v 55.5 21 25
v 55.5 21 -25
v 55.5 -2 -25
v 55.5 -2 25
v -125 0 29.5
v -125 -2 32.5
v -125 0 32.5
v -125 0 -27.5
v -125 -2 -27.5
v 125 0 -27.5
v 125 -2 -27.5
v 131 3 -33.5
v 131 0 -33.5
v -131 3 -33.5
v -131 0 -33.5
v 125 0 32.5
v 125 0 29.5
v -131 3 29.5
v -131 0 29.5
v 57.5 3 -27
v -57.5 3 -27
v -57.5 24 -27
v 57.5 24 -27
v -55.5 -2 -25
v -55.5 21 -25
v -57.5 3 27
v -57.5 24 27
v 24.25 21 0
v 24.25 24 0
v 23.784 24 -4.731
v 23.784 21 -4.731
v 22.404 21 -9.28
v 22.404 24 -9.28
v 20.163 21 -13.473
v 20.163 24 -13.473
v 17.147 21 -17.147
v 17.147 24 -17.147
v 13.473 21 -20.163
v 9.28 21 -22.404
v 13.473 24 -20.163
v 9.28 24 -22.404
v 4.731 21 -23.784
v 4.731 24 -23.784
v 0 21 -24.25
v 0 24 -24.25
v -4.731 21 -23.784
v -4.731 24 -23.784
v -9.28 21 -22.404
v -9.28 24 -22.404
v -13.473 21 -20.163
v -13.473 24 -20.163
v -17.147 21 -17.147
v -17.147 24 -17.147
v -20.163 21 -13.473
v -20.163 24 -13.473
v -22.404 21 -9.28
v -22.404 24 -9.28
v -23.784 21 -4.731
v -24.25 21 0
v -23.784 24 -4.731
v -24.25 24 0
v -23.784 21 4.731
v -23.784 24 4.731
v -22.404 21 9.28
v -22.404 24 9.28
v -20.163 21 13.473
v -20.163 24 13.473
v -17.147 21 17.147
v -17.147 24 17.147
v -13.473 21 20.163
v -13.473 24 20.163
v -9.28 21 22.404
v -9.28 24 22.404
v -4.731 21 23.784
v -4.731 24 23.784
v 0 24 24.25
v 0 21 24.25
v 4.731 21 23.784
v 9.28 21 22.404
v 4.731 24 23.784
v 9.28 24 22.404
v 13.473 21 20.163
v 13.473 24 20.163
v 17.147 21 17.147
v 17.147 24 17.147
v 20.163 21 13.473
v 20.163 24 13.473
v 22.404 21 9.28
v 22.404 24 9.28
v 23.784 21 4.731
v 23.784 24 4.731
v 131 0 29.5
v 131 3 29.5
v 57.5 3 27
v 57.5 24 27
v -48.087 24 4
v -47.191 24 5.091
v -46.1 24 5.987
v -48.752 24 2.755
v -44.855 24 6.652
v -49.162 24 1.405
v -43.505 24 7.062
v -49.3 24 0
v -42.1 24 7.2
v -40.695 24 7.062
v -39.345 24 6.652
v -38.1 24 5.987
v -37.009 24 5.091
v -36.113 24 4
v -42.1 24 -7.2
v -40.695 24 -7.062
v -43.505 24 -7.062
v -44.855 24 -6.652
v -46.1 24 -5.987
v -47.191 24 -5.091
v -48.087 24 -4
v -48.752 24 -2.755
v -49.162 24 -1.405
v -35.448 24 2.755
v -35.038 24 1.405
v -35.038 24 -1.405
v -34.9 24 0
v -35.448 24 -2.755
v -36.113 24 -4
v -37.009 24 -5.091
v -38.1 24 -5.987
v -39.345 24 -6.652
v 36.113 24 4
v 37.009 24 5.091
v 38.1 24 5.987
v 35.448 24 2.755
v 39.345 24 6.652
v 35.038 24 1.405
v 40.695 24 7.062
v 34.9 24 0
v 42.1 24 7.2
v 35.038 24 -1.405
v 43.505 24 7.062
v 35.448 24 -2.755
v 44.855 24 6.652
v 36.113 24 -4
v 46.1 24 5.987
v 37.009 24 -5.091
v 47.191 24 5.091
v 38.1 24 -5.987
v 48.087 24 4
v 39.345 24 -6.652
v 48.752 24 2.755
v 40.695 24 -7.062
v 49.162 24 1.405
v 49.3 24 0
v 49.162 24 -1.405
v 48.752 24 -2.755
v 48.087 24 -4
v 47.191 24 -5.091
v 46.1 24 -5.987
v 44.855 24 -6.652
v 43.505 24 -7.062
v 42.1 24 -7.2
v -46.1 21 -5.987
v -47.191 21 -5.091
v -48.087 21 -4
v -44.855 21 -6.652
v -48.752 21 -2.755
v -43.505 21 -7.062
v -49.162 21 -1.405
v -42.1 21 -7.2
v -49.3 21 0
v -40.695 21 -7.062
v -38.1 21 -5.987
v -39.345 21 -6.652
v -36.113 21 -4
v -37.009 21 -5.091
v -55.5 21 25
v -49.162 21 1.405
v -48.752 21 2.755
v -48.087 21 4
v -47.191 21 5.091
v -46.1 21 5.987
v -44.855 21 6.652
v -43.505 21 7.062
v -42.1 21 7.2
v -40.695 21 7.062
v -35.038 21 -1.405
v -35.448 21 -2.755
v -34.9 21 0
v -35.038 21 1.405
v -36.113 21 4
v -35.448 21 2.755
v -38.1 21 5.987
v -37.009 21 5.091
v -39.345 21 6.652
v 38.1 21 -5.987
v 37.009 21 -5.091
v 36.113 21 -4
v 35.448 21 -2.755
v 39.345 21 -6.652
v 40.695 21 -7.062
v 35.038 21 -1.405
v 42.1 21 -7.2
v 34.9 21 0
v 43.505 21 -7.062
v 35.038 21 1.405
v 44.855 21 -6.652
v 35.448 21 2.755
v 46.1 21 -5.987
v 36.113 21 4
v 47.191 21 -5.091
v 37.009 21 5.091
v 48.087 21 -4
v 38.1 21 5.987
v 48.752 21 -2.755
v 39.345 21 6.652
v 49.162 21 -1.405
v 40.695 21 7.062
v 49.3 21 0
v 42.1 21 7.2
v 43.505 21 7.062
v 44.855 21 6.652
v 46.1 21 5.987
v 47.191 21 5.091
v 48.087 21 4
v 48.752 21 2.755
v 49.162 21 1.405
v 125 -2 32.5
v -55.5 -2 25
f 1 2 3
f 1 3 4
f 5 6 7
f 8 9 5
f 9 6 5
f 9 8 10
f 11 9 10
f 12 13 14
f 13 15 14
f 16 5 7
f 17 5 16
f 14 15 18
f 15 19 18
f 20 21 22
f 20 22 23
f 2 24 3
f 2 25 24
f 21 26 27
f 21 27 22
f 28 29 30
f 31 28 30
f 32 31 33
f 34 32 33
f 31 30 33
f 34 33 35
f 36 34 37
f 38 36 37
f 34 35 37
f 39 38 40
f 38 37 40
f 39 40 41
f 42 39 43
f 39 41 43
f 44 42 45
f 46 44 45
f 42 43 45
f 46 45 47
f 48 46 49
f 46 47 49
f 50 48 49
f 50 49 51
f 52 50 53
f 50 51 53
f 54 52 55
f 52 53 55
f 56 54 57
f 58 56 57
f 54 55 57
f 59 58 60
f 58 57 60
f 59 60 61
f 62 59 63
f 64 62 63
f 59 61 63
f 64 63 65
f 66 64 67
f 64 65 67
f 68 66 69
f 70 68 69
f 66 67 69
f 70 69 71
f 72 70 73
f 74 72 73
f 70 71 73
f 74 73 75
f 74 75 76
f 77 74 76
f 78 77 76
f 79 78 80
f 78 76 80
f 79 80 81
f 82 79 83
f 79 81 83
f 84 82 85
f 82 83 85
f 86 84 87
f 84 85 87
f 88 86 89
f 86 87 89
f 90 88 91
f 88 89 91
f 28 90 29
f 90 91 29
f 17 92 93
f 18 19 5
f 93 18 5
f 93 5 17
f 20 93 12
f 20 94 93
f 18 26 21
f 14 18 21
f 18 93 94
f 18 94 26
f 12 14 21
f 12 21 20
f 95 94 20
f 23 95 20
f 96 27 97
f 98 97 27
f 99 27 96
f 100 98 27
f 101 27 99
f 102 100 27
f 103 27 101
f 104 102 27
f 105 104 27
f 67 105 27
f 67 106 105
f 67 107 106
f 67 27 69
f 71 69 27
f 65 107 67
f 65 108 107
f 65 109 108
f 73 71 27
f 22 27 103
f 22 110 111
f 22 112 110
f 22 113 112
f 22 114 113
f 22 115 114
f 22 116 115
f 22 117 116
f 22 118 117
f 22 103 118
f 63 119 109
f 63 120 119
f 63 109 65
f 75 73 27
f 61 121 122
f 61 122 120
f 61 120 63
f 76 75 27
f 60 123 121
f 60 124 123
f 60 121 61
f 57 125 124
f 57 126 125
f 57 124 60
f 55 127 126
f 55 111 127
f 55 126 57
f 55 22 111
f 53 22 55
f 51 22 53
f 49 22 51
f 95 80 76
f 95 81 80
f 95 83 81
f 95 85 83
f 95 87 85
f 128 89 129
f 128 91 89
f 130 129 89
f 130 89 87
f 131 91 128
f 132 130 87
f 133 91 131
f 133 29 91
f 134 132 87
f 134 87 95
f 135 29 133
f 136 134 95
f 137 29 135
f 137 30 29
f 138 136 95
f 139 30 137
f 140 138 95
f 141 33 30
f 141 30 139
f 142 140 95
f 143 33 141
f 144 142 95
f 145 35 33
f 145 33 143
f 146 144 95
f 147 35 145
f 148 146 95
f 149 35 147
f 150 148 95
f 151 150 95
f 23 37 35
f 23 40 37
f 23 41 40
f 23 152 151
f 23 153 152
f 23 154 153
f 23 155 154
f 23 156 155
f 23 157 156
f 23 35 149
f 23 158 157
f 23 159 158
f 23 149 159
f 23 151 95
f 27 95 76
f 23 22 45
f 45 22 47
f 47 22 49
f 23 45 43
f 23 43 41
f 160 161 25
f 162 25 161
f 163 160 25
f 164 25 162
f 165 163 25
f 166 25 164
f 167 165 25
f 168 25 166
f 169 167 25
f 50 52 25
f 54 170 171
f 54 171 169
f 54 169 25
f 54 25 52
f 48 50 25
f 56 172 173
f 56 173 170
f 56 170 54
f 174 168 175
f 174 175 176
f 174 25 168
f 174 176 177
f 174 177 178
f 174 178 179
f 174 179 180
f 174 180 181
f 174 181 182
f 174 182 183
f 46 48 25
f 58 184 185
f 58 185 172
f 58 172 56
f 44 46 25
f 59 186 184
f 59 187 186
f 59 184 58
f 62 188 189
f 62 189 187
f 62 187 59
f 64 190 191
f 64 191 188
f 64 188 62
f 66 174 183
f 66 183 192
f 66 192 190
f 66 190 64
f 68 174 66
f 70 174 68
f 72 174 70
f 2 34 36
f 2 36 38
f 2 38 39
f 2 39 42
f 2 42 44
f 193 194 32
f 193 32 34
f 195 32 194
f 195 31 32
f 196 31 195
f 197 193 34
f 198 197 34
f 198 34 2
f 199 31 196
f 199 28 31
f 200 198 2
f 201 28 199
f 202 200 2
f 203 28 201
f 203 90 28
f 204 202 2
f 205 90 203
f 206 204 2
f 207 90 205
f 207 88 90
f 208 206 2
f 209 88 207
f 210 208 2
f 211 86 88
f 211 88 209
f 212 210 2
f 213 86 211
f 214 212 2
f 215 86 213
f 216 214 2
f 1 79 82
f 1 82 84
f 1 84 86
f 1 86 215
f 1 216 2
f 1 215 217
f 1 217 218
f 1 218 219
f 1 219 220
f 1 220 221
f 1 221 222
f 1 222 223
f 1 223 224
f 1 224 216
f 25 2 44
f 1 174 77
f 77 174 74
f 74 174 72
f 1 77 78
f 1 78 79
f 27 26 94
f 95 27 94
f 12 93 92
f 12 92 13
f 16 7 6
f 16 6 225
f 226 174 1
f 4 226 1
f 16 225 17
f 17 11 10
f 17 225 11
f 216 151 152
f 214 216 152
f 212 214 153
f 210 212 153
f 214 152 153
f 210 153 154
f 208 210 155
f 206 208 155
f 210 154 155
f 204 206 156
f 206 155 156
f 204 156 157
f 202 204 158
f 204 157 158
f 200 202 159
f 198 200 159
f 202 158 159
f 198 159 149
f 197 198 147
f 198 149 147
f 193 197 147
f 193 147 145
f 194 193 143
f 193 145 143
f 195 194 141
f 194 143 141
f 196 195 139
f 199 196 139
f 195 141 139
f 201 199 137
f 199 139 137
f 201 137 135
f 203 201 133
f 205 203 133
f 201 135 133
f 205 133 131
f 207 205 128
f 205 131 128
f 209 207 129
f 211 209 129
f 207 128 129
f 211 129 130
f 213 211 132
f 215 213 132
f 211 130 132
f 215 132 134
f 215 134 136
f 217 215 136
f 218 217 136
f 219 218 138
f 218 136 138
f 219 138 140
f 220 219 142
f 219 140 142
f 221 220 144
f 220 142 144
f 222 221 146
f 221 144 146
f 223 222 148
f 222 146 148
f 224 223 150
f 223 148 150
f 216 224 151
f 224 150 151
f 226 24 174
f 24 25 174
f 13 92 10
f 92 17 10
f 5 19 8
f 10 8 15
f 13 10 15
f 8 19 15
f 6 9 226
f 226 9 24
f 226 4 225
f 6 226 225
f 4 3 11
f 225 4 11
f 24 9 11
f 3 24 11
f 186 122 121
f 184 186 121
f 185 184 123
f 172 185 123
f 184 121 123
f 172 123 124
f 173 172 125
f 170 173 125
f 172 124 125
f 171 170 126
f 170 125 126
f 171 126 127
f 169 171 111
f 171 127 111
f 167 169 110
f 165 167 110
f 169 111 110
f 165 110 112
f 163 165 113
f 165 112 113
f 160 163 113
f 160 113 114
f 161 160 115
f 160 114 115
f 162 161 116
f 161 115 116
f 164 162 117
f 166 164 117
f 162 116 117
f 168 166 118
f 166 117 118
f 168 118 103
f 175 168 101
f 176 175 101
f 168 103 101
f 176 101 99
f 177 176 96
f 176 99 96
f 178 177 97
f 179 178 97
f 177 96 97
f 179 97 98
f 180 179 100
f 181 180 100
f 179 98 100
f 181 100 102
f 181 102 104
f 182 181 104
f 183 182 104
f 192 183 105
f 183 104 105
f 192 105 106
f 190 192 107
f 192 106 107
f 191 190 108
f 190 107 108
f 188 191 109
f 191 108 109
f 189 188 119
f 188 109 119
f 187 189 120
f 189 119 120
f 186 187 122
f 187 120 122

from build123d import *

# Parameters (mm, degrees)
SKETCH1_W           = 254
SKETCH1_H           = 59
BOSS_EXTRUDE1_DEPTH = 3
SKETCH2_W           = 115
SKETCH2_H           = 54
BOSS_EXTRUDE2_DEPTH = 21
SKETCH3_W           = 111
SKETCH3_H           = 50
CUT_EXTRUDE3_DEPTH  = 21
SKETCH4_R           = 7.2
SKETCH4_R_2         = 24.25
CUT_EXTRUDE4_DEPTH  = 3
SKETCH5_W           = 250
SKETCH5_H           = 59
SKETCH5_W_2         = 111
SKETCH5_H_2         = 50
BOSS_EXTRUDE3_DEPTH = 2
SKETCH6_W           = 59
SKETCH6_H           = 3
BOSS_EXTRUDE4_DEPTH = 4
SKETCH7_W           = 258
SKETCH7_H           = 3
BOSS_EXTRUDE5_DEPTH = 4
SKETCH8_W           = 63
SKETCH8_H           = 3
BOSS_EXTRUDE6_DEPTH = 4
SKETCH9_W           = 250
SKETCH9_H           = 2
BOSS_EXTRUDE7_DEPTH = 1


with BuildPart() as part:
    # Sketch1 → Boss-Extrude1 (new body)
    with BuildSketch(Plane(origin=(0, 0, 0), x_dir=(1, 0, 0), z_dir=(0, 1, 0))):
        Rectangle(SKETCH1_W, SKETCH1_H)
    extrude(amount=BOSS_EXTRUDE1_DEPTH)

    # Sketch2 → Boss-Extrude2 (add)
    with BuildSketch(Plane(origin=(0, 3, 0), x_dir=(1, 0, 0), z_dir=(0, 1, 0))):
        Rectangle(SKETCH2_W, SKETCH2_H)
    extrude(amount=BOSS_EXTRUDE2_DEPTH)

    # Sketch3 → Cut-Extrude3 (cut)
    with BuildSketch(Plane.XZ):
        Rectangle(SKETCH3_W, SKETCH3_H)
    extrude(amount=-CUT_EXTRUDE3_DEPTH, mode=Mode.SUBTRACT)

    # Sketch4 → Cut-Extrude4 (cut)
    with BuildSketch(Plane(origin=(0, 24, 0), x_dir=(1, 0, 0), z_dir=(0, 1, 0))):
        with Locations((-42.1, 0)):
            Circle(SKETCH4_R)
        Circle(SKETCH4_R_2)
        with Locations((42.1, 0)):
            Circle(SKETCH4_R)
    extrude(amount=-CUT_EXTRUDE4_DEPTH, mode=Mode.SUBTRACT)

    # Sketch5 → Boss-Extrude3 (add)
    with BuildSketch(Plane.XZ):
        with Locations((0, 2)):
            Rectangle(SKETCH5_W, SKETCH5_H)
        Rectangle(SKETCH5_W_2, SKETCH5_H_2, mode=Mode.SUBTRACT)
    extrude(amount=BOSS_EXTRUDE3_DEPTH)

    # Sketch6 → Boss-Extrude4 (add)
    with BuildSketch(Plane.ZY.offset(127)):
        with Locations((0, 1.5)):
            Rectangle(SKETCH6_W, SKETCH6_H)
    extrude(amount=BOSS_EXTRUDE4_DEPTH)

    # Sketch7 → Boss-Extrude5 (add)
    with BuildSketch(Plane(origin=(0, 0, -29.5), x_dir=(-1, 0, 0), z_dir=(0, 0, -1))):
        with Locations((2, 1.5)):
            Rectangle(SKETCH7_W, SKETCH7_H)
    extrude(amount=BOSS_EXTRUDE5_DEPTH)

    # Sketch8 → Boss-Extrude6 (add)
    with BuildSketch(Plane(origin=(127, 0, 0), x_dir=(0, 0, -1), z_dir=(1, 0, 0))):
        with Locations((2, 1.5)):
            Rectangle(SKETCH8_W, SKETCH8_H)
    extrude(amount=BOSS_EXTRUDE6_DEPTH)

    # Sketch9 → Boss-Extrude7 (add)
    with BuildSketch(Plane.XY.offset(31.5)):
        with Locations((0, -1)):
            Rectangle(SKETCH9_W, SKETCH9_H)
    extrude(amount=BOSS_EXTRUDE7_DEPTH)


solid = part.part
